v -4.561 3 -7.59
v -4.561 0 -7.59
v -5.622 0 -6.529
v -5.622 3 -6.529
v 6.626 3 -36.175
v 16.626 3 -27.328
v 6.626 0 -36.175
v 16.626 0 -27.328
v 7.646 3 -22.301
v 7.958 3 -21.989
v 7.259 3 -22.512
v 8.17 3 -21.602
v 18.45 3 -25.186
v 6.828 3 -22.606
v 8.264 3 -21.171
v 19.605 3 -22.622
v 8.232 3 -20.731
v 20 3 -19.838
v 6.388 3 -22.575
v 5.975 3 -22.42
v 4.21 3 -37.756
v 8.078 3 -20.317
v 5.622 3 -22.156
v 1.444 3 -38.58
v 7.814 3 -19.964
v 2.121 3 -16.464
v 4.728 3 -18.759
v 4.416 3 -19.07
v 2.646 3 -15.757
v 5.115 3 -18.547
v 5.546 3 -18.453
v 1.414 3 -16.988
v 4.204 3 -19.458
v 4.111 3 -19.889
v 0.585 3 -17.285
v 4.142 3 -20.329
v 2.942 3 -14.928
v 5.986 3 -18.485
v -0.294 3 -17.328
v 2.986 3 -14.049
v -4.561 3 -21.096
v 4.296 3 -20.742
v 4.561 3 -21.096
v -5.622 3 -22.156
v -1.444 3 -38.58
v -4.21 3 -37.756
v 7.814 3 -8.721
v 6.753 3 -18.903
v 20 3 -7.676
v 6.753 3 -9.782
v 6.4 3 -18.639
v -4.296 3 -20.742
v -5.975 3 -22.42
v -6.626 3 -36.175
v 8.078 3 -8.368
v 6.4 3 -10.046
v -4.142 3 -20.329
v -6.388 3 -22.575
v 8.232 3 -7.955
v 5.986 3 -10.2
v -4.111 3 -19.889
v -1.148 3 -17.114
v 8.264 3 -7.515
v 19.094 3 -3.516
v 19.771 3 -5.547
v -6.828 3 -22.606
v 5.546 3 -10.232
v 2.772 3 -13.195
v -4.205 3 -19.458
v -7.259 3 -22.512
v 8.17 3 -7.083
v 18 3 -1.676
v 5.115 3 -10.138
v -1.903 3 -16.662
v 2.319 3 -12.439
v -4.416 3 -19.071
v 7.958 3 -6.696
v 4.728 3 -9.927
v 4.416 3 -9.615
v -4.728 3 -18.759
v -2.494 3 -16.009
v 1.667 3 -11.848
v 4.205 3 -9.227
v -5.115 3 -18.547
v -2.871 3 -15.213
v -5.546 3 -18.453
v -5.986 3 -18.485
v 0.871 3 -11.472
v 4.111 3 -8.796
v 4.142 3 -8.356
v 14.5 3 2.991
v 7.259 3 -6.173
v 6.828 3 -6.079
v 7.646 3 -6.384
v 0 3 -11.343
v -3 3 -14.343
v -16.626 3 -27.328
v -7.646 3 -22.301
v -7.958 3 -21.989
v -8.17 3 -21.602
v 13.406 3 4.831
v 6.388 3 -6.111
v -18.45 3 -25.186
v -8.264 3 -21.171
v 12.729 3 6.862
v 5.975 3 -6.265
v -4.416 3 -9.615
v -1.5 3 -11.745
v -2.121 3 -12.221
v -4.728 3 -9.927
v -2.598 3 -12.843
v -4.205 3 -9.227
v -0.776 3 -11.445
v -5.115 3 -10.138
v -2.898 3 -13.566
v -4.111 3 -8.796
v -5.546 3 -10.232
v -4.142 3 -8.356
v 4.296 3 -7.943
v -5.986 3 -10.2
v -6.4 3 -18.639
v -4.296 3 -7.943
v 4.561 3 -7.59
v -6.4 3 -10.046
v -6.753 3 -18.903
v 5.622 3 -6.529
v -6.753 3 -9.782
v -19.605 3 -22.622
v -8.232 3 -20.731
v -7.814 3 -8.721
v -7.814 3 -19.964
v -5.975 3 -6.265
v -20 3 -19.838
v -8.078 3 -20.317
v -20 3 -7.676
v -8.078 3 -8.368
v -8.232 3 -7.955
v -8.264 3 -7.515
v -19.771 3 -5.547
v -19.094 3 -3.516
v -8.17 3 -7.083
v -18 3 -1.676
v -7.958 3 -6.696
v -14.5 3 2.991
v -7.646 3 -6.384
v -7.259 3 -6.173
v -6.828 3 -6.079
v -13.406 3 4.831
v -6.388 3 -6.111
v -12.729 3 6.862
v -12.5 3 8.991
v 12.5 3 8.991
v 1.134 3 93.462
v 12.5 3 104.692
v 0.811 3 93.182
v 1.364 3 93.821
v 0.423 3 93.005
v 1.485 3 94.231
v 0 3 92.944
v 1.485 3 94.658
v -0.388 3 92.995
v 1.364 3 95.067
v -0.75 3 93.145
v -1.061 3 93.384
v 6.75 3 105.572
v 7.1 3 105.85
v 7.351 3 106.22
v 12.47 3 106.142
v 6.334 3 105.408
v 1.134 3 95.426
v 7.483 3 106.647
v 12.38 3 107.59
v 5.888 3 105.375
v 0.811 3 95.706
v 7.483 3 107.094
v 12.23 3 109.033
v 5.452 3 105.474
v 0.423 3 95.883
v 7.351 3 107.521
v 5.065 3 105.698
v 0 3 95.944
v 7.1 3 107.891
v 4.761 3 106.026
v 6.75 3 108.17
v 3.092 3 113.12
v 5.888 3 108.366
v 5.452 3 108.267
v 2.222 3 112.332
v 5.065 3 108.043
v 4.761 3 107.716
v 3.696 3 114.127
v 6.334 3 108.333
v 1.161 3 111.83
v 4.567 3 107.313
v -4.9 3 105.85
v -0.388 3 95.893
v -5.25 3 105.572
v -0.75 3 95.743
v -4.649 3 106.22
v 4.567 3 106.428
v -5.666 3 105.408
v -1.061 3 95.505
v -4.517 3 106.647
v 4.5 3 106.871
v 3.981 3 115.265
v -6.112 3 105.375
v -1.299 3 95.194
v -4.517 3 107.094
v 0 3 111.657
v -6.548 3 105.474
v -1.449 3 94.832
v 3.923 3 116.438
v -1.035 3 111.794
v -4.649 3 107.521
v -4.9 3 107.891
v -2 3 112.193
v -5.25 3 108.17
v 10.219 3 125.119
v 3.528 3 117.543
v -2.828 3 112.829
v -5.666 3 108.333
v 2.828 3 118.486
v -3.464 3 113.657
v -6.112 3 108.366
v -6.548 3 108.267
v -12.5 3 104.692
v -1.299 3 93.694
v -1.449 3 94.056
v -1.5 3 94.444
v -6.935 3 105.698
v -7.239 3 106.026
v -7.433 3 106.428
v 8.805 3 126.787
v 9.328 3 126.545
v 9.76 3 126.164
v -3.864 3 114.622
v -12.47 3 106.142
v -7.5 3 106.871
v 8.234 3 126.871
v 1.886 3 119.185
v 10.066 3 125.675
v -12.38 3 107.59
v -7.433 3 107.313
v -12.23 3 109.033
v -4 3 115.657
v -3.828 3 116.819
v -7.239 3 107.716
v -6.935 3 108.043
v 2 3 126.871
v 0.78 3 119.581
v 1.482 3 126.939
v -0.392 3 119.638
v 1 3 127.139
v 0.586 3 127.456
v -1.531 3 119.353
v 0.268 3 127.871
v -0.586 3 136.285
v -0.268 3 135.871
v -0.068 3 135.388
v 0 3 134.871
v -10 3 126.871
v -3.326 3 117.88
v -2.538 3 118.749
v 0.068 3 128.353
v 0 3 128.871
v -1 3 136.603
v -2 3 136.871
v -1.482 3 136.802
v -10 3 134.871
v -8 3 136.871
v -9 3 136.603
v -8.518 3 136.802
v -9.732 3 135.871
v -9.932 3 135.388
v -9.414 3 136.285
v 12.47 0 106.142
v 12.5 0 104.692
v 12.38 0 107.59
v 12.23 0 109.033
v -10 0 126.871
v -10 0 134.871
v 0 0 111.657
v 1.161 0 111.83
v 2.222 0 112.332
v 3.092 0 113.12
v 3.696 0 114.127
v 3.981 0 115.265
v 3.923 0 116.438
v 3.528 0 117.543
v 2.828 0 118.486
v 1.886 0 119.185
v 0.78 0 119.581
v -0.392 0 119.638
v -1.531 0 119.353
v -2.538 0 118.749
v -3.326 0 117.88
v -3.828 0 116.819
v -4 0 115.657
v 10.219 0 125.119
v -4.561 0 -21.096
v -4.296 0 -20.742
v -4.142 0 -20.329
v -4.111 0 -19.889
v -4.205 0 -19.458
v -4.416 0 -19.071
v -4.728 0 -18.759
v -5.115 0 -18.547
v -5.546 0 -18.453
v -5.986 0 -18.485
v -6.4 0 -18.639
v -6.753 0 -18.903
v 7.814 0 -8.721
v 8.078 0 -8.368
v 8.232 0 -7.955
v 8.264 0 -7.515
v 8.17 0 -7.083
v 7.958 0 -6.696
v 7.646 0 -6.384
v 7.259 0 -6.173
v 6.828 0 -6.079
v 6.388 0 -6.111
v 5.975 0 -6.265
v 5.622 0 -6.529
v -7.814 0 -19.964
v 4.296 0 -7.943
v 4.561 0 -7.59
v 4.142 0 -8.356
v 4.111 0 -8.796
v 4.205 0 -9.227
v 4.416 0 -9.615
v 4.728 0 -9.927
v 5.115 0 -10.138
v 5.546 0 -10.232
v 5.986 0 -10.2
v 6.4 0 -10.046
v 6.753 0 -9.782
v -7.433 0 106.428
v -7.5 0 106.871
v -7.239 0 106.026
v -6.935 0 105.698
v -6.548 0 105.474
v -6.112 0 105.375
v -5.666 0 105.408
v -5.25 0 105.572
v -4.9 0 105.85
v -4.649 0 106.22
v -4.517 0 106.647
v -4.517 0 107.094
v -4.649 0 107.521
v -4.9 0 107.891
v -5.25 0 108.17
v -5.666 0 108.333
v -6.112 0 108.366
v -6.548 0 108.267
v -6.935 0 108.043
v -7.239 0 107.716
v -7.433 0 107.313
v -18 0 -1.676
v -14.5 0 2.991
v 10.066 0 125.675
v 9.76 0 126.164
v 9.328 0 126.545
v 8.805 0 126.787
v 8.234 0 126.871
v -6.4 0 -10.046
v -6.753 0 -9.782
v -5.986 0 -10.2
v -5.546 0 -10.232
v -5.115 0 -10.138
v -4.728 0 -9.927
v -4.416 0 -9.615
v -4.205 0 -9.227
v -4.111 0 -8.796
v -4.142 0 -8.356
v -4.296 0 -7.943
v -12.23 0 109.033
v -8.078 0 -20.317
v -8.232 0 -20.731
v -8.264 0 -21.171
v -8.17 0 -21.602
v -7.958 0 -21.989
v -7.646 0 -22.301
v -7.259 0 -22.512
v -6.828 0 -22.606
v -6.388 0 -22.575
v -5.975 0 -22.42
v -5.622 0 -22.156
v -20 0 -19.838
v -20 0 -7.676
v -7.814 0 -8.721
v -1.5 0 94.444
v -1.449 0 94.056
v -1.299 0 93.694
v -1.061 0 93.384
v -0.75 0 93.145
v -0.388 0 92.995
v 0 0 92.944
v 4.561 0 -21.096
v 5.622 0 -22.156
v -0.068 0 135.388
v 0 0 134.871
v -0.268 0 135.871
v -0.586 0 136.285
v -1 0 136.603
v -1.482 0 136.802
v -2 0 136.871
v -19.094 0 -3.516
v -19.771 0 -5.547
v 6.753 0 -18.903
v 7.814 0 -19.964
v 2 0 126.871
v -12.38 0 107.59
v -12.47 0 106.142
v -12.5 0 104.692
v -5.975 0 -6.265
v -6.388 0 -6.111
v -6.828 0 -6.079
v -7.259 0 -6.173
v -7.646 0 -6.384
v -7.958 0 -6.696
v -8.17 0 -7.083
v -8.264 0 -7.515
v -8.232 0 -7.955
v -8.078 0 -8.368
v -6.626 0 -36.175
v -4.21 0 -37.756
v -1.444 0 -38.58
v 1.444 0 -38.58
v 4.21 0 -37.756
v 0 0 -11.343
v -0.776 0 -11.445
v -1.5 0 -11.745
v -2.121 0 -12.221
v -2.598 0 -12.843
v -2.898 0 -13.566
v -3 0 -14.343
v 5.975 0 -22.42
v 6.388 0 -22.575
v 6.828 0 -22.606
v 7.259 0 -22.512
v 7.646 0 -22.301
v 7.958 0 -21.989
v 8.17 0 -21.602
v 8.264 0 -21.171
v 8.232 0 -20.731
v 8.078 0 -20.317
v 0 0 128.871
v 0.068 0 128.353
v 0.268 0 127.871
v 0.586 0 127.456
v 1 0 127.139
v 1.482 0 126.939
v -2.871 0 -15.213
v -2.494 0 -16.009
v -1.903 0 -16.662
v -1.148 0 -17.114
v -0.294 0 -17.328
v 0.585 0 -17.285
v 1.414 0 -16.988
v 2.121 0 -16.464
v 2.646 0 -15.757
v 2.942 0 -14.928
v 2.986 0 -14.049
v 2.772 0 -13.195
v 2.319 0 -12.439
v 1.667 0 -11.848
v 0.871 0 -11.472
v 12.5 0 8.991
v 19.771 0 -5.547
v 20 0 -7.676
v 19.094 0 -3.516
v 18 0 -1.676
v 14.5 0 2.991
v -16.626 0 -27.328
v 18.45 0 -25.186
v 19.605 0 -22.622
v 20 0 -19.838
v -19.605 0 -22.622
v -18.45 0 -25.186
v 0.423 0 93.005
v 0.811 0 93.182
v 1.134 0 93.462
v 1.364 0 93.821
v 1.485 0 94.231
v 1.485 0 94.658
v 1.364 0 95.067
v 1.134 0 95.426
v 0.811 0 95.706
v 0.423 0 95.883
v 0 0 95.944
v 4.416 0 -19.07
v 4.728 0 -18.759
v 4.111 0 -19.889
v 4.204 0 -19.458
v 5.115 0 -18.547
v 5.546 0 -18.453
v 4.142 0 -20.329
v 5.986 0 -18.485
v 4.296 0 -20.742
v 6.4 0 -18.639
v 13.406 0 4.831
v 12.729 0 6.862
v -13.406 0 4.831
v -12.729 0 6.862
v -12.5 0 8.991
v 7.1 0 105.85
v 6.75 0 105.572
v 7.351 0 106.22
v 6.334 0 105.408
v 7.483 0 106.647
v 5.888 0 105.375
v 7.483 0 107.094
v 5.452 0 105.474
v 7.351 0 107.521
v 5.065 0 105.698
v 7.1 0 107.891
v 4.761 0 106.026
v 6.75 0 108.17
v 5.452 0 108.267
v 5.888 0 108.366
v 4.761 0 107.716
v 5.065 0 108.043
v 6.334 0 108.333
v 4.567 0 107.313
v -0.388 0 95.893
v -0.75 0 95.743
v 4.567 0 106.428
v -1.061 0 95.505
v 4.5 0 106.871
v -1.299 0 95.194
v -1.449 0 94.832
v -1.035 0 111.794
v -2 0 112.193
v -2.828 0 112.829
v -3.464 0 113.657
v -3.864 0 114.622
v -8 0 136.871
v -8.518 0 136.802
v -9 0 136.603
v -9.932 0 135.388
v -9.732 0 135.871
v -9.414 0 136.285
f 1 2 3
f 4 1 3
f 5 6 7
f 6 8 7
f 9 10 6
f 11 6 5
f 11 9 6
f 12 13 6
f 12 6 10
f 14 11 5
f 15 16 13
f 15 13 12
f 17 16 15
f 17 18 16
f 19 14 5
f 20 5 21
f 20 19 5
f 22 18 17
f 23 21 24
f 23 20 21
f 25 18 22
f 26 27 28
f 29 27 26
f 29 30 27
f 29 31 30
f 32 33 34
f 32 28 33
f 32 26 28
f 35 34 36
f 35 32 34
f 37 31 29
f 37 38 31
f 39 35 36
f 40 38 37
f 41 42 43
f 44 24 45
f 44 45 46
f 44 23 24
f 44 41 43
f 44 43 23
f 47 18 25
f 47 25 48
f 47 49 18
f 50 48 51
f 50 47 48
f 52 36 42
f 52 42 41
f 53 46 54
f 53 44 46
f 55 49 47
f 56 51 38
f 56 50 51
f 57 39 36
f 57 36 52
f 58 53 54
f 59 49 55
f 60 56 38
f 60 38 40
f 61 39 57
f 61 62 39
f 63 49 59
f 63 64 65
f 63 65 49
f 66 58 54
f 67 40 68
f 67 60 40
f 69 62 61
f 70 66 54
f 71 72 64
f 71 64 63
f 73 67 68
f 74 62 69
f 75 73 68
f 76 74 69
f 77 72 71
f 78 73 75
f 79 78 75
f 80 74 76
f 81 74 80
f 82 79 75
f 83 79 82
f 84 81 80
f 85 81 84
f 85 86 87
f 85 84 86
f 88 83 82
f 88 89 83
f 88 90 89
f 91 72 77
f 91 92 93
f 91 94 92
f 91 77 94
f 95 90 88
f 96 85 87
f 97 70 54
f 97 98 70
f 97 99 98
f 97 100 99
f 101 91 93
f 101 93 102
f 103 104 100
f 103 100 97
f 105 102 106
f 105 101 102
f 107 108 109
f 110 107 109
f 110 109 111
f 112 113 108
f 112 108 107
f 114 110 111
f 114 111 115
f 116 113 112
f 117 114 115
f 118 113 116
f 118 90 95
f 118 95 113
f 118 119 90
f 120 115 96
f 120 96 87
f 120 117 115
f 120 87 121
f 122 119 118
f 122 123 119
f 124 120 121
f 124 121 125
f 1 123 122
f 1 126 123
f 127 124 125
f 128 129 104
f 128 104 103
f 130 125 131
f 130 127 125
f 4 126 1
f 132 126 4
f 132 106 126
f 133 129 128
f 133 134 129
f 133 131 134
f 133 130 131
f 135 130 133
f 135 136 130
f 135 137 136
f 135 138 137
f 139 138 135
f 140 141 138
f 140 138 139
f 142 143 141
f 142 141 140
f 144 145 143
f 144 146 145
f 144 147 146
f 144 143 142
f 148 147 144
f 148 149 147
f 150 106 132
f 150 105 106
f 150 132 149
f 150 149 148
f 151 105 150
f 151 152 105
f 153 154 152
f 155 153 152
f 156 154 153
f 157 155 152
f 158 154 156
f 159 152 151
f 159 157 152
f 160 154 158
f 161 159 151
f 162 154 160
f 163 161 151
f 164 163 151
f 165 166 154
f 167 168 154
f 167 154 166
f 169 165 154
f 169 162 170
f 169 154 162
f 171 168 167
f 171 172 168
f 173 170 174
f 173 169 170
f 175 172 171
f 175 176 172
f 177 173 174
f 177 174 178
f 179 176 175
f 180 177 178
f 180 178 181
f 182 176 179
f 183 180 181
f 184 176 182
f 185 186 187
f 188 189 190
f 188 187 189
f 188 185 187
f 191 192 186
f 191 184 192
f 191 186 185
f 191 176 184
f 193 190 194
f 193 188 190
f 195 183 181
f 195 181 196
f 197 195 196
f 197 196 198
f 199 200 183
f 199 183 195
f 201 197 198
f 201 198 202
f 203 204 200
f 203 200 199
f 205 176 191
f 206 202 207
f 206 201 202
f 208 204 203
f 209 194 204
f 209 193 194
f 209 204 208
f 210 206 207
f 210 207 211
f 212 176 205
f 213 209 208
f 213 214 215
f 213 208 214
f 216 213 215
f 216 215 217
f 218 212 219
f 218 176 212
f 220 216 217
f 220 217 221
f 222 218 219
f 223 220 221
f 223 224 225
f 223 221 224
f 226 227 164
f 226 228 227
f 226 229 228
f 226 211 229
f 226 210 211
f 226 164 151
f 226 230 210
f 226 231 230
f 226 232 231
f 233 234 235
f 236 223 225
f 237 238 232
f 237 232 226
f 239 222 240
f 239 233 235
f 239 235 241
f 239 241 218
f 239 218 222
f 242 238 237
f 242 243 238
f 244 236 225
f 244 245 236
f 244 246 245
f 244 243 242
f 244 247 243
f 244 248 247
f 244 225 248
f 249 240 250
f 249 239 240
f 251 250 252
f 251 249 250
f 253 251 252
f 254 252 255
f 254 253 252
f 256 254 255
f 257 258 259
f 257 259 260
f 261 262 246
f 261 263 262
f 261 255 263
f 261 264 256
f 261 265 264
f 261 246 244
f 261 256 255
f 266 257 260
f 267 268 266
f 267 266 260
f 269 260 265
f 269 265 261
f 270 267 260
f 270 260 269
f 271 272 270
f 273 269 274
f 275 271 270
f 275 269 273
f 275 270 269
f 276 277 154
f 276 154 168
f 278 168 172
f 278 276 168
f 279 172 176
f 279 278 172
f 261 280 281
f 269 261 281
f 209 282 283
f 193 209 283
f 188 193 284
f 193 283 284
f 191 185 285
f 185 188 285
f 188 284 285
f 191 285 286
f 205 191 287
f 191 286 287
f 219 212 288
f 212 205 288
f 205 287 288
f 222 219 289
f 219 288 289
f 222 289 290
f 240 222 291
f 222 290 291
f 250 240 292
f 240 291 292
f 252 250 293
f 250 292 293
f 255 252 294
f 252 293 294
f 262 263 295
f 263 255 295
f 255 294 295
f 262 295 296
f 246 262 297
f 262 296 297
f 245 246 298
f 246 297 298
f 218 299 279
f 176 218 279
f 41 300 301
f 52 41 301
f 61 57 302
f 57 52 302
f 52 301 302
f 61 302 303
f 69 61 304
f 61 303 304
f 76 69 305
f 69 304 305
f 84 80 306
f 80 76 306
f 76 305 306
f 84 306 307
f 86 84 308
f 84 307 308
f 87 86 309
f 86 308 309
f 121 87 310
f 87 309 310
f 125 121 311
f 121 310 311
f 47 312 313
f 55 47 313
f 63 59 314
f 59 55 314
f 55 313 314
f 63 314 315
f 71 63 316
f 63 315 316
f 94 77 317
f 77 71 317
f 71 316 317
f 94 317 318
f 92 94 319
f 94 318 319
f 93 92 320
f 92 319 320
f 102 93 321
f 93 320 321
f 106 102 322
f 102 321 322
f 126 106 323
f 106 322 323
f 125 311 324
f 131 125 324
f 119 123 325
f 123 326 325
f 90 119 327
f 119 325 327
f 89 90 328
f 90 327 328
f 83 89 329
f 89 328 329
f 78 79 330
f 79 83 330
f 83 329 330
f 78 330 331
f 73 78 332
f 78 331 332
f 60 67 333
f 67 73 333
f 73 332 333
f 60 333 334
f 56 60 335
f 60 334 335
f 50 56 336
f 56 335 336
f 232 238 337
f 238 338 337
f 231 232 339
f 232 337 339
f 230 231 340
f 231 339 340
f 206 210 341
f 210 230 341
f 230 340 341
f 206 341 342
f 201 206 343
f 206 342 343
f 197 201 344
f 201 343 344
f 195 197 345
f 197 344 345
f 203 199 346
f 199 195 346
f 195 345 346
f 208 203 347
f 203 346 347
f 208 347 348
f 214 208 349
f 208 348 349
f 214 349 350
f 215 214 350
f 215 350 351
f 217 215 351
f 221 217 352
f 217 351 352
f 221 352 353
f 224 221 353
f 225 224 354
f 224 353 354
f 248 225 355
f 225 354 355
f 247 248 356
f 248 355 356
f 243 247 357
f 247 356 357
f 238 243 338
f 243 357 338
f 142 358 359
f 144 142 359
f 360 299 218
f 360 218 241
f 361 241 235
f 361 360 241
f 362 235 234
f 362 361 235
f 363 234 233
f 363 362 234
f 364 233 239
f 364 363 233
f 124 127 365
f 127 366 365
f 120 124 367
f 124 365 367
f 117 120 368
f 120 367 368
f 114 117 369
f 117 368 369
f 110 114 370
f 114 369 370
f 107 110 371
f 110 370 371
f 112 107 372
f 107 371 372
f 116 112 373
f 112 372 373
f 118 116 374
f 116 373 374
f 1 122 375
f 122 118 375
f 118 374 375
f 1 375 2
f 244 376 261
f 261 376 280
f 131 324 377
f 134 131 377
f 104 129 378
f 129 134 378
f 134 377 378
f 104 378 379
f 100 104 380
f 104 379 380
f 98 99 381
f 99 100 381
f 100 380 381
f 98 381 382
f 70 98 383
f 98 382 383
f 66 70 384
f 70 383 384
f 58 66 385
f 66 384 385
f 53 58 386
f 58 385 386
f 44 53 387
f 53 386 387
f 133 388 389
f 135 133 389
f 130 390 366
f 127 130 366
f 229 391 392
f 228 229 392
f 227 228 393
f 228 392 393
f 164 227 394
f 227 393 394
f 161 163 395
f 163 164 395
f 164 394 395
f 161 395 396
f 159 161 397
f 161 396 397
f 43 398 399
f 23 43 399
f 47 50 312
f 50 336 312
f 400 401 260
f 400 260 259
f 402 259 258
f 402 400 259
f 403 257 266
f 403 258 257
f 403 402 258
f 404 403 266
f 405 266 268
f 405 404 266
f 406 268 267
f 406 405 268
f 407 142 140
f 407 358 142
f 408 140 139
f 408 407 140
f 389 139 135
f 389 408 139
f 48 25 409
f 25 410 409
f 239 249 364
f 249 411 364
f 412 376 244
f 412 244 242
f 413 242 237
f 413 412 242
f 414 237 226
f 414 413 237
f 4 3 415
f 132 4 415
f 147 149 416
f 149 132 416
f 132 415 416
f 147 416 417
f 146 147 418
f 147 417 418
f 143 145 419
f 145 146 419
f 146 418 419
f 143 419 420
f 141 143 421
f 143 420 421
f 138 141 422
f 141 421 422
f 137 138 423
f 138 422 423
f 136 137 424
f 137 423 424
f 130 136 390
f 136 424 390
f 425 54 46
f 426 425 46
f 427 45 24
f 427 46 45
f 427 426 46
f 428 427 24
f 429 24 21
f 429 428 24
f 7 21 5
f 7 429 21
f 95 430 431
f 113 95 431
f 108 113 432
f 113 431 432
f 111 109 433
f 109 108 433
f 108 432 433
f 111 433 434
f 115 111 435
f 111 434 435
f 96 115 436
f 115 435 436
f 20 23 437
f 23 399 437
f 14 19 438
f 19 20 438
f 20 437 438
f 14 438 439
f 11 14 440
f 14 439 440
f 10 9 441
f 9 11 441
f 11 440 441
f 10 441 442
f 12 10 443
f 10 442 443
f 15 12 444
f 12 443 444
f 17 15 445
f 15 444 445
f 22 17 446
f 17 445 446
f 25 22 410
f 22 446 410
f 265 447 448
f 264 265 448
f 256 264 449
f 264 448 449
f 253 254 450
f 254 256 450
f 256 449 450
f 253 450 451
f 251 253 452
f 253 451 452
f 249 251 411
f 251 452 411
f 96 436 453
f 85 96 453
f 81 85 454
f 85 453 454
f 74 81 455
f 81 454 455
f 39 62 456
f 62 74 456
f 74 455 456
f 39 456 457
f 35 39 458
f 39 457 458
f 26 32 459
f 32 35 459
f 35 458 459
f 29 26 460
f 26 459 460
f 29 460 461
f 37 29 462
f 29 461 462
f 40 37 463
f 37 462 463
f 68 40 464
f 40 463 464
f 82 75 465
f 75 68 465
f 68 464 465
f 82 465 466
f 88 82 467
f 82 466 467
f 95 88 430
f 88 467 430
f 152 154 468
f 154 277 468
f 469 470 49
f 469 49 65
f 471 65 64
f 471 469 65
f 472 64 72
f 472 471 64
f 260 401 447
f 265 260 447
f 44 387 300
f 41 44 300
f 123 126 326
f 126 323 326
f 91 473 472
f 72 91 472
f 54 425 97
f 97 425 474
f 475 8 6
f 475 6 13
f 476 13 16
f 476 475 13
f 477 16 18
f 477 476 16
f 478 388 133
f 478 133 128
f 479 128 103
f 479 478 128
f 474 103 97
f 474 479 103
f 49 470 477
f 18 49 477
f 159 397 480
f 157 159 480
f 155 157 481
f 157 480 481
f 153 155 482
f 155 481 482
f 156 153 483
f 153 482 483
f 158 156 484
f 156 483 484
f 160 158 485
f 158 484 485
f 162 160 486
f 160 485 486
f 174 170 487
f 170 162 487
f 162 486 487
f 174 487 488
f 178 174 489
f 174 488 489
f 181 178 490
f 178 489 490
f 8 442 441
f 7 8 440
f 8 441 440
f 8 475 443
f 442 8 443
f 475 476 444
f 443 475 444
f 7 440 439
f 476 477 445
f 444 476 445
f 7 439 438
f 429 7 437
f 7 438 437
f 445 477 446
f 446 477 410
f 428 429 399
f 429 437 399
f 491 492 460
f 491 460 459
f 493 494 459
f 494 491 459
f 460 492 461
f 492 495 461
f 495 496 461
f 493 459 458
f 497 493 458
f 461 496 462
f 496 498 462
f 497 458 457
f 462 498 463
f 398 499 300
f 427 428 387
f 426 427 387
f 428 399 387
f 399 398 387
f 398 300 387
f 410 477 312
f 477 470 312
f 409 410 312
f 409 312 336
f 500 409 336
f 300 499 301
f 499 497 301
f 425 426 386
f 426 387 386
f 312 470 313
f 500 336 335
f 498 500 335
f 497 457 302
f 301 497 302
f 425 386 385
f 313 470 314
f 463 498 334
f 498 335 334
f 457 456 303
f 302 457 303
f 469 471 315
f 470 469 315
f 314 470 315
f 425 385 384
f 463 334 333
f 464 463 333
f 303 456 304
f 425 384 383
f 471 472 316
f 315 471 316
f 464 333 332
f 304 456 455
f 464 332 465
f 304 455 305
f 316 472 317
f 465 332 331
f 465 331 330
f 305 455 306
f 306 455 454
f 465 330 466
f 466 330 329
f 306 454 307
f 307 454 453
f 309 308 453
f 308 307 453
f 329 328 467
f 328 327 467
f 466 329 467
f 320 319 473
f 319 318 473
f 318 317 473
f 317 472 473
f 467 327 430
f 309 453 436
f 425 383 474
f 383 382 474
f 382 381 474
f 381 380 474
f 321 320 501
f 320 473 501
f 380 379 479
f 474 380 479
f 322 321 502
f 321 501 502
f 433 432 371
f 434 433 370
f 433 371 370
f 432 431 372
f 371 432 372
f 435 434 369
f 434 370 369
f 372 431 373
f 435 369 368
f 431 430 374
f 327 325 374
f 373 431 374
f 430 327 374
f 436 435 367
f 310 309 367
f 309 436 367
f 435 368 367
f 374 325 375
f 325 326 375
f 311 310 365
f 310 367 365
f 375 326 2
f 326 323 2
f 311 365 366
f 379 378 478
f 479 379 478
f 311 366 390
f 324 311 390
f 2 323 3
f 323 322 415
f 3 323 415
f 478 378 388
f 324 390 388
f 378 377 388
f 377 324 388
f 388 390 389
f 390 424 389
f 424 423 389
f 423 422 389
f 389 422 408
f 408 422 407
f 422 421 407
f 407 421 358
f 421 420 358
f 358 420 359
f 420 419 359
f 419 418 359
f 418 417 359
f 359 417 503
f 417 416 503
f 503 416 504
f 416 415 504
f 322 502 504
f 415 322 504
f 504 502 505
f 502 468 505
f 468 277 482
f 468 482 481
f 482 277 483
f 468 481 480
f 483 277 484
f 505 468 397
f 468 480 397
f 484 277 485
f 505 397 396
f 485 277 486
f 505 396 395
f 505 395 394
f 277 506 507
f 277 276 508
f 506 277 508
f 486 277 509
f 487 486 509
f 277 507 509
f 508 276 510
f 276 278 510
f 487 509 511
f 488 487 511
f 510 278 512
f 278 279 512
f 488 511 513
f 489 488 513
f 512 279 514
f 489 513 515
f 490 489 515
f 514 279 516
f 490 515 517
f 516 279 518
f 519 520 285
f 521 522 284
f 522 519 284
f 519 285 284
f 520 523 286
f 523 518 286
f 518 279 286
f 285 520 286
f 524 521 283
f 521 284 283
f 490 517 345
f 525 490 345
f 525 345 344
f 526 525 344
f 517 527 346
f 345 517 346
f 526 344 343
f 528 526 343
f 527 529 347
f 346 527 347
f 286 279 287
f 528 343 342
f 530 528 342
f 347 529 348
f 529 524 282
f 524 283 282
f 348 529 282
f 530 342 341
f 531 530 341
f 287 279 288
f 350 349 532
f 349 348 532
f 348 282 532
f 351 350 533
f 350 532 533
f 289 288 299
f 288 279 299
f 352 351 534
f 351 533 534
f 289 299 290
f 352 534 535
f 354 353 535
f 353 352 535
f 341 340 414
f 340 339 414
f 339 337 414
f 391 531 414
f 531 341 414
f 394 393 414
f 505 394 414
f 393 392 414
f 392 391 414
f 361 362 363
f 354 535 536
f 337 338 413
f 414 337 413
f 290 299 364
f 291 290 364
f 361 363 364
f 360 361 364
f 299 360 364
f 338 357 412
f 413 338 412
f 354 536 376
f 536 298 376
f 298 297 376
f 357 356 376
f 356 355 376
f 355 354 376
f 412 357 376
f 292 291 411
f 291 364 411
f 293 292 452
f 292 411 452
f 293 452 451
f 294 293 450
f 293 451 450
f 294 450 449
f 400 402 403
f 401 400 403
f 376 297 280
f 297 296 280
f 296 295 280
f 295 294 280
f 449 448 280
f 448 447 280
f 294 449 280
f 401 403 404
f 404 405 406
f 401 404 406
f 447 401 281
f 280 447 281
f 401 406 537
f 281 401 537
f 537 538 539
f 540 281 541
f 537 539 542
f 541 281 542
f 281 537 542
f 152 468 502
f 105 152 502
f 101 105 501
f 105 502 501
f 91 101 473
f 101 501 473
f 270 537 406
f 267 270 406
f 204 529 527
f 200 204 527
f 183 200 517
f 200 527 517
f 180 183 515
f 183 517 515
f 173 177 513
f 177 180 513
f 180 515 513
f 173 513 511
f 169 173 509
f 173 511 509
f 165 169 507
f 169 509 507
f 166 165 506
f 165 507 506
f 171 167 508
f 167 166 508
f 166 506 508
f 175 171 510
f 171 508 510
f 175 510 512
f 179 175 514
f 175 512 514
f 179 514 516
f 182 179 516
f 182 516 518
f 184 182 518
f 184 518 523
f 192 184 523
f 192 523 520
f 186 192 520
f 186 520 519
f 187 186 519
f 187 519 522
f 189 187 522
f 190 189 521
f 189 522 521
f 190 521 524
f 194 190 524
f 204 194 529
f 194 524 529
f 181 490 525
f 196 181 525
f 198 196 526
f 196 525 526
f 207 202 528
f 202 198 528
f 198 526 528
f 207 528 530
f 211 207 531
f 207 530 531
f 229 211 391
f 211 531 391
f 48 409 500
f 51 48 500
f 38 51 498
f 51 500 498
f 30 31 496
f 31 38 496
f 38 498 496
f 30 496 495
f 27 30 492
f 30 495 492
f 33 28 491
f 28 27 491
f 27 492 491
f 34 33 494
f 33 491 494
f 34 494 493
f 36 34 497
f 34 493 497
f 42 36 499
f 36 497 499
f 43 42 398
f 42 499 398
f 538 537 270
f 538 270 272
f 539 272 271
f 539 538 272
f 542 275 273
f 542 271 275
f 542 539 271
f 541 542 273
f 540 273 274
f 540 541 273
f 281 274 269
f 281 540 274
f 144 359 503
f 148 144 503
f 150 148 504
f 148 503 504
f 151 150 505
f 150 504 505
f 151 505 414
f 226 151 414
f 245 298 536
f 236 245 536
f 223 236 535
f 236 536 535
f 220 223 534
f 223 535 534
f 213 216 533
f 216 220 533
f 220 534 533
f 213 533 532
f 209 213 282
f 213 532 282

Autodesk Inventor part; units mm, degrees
ref_plane "YZ Plane" through (0, 0, 0) normal (1, 0, 0) x (0, 1, 0)
ref_plane "XZ Plane" through (0, 0, 0) normal (0, 1, 0) x (-1, 0, 0)
ref_plane "XY Plane" through (0, 0, 0) normal (0, 0, 1) x (1, 0, 0)
sketch "Sketch3" plane through (0, 0, 0) normal (0, 1, 0) x (-1, 0, 0)
  line L0 (6.6262, -36.1747) -> (16.6262, -27.3275)
  arc A0 (16.6262, -27.3275) -> (20, -19.8379) centre (10, -19.8379) ccw
  line L1 (20, -19.8379) -> (20, -7.6759)
  arc A1 (20, -7.6759) -> (18, -1.6759) centre (10, -7.6759) ccw
  line L2 (18, -1.6759) -> (14.5, 2.9908)
  arc A2 (12.5, 8.9908) -> (14.5, 2.9908) centre (22.5, 8.9908) ccw
  arc A3 (-14.5, 2.9908) -> (-12.5, 8.9908) centre (-22.5, 8.9908) ccw
  line L3 (-14.5, 2.9908) -> (-18, -1.6759)
  arc A4 (-18, -1.6759) -> (-20, -7.6759) centre (-10, -7.6759) ccw
  line L4 (-20, -7.6759) -> (-20, -19.8379)
  arc A5 (-20, -19.8379) -> (-16.6262, -27.3275) centre (-10, -19.8379) ccw
  line L5 (-16.6262, -27.3275) -> (-6.6262, -36.1747)
  arc A6 (-6.6262, -36.1747) -> (6.6262, -36.1747) centre (0, -28.6852) ccw
  line L6 (-7.8135, -19.9641) -> (-6.7529, -18.9034)
  arc A7 (-4.5608, -21.0955) -> (-6.7529, -18.9034) centre (-5.6569, -19.9994) ccw
  line L7 (-4.5608, -21.0955) -> (-5.6215, -22.1561)
  arc A8 (-7.8135, -19.9641) -> (-5.6215, -22.1561) centre (-6.7175, -21.0601) ccw
  arc A9 (5.6215, -22.1561) -> (7.8135, -19.9641) centre (6.7175, -21.0601) ccw
  line L8 (5.6215, -22.1561) -> (4.5608, -21.0955)
  arc A10 (6.7529, -18.9034) -> (4.5608, -21.0955) centre (5.6569, -19.9994) ccw
  line L9 (6.7529, -18.9034) -> (7.8135, -19.9641)
  arc A11 (-6.7529, -9.7817) -> (-4.5608, -7.5897) centre (-5.6569, -8.6857) ccw
  line L10 (-6.7529, -9.7817) -> (-7.8135, -8.7211)
  arc A12 (-5.6215, -6.5291) -> (-7.8135, -8.7211) centre (-6.7175, -7.6251) ccw
  line L11 (-5.6215, -6.5291) -> (-4.5608, -7.5897)
  arc A13 (7.8135, -8.7211) -> (5.6215, -6.5291) centre (6.7175, -7.6251) ccw
  line L12 (7.8135, -8.7211) -> (6.7529, -9.7817)
  arc A14 (4.5608, -7.5897) -> (6.7529, -9.7817) centre (5.6569, -8.6857) ccw
  line L13 (4.5608, -7.5897) -> (5.6215, -6.5291)
  circle A15 centre (0, -14.3426) radius 3
  line L14 (-12.5, 8.9908) -> (12.5, 8.9908) construction
  arc A16 (12.5, 104.6916) -> (12.2297, 109.0328) centre (-22.5, 104.6916) ccw
  line L15 (12.2297, 109.0328) -> (10, 126.8706)
  line L16 (10, 126.8706) -> (10, 134.8706)
  arc A17 (10, 134.8706) -> (8, 136.8706) centre (8, 134.8706) ccw
  line L17 (8, 136.8706) -> (2, 136.8706)
  arc A18 (2, 136.8706) -> (0, 134.8706) centre (2, 134.8706) ccw
  line L18 (0, 134.8706) -> (0, 128.8706)
  arc A19 (-2, 126.8706) -> (0, 128.8706) centre (-2, 128.8706) ccw
  line L19 (-2, 126.8706) -> (-8.2344, 126.8706)
  arc A20 (-8.2344, 126.8706) -> (-10.219, 125.1187) centre (-8.2344, 124.8706) ccw
  line L20 (-10.219, 125.1187) -> (-12.2297, 109.0328)
  arc A21 (-12.2297, 109.0328) -> (-12.5, 104.6916) centre (22.5, 104.6916) ccw
  circle A22 centre (6, 106.8706) radius 1.5
  circle A23 centre (-6, 106.8706) radius 1.5
  circle A24 centre (0, 94.4442) radius 1.5
  circle A25 centre (0, 115.6574) radius 4
  line L21 (-12.5, 104.6916) -> (12.5, 104.6916) construction
  line L22 (0, -14.3426) -> (0, 115.6574)
  line L23 (12.5, 8.9908) -> (12.5, 104.6916)
  line L24 (-12.5, 104.6916) -> (-12.5, 8.9908)
  dimension "d4" = 21.2132
  dimension "d7" = 12
  dimension "d8" = 130
extrude "Extrusion1" add sketch "Sketch3" along normal blind 3
sketch "Sketch4" plane through (0, 3, 0) normal (0, 1, 0) x (1, 0, 0)
  circle A0 centre (0, 14.3426) radius 3 construction
  circle A1 centre (0, 14.3426) radius 88.9 construction
  circle A2 centre (0, -115.6574) radius 4 projected
  point P0 (0, 0)
  dimension "d9" = 177.8
  dimension "d10" = 130
sketch "Sketch5" plane through (0, 3, 0) normal (0, 1, 0) x (1, 0, 0)
  line L0 (-12.5, -8.9908) -> (-12.5, -104.6916) projected
  line L1 (12.5, -104.6916) -> (12.5, -8.9908) projected
  arc A0 (-12.5, -8.9908) -> (-14.5, -2.9908) centre (-22.5, -8.9908) ccw projected
  arc A1 (14.5, -2.9908) -> (12.5, -8.9908) centre (22.5, -8.9908) ccw projected
  line L2 (14.5, -2.9908) -> (18, 1.6759) projected
  line L3 (-18, 1.6759) -> (-14.5, -2.9908) projected
  circle A2 centre (0, -94.4442) radius 1.5 construction
  line L4 (0, 0) -> (0, -94.4442) construction
  line L5 (-7.5, 0) -> (-7.5, -94.4442)
  line L6 (7.5, 0) -> (7.5, -94.4442)
  line L7 (-18, 1.6759) -> (-14.5, -2.9908) projected
  line L8 (-14.5, -2.9908) -> (-7.5, -12.3241)
  line L9 (14.5, -2.9908) -> (7.5, -12.3241)
  circle A3 centre (0, 14.3426) radius 88.9 construction
  line L10 (-7.5, -74.2405) -> (-12.5, -81.1047)
  line L11 (7.5, -74.2405) -> (12.5, -80.9071)
  arc A4 (-16.6262, 27.3275) -> (-20, 19.8379) centre (-10, 19.8379) ccw construction
  dimension "d11" = 7.5
  dimension "d12" = 7.5
  dimension "d13" = 143.13
  dimension "d14" = 143.13
  dimension "d15" = 143.93
  dimension "d18" = 10
extrude "Extrusion2" [suppressed]
fillet "Fillet1" [suppressed]
properties part number "Kauri arm short"
